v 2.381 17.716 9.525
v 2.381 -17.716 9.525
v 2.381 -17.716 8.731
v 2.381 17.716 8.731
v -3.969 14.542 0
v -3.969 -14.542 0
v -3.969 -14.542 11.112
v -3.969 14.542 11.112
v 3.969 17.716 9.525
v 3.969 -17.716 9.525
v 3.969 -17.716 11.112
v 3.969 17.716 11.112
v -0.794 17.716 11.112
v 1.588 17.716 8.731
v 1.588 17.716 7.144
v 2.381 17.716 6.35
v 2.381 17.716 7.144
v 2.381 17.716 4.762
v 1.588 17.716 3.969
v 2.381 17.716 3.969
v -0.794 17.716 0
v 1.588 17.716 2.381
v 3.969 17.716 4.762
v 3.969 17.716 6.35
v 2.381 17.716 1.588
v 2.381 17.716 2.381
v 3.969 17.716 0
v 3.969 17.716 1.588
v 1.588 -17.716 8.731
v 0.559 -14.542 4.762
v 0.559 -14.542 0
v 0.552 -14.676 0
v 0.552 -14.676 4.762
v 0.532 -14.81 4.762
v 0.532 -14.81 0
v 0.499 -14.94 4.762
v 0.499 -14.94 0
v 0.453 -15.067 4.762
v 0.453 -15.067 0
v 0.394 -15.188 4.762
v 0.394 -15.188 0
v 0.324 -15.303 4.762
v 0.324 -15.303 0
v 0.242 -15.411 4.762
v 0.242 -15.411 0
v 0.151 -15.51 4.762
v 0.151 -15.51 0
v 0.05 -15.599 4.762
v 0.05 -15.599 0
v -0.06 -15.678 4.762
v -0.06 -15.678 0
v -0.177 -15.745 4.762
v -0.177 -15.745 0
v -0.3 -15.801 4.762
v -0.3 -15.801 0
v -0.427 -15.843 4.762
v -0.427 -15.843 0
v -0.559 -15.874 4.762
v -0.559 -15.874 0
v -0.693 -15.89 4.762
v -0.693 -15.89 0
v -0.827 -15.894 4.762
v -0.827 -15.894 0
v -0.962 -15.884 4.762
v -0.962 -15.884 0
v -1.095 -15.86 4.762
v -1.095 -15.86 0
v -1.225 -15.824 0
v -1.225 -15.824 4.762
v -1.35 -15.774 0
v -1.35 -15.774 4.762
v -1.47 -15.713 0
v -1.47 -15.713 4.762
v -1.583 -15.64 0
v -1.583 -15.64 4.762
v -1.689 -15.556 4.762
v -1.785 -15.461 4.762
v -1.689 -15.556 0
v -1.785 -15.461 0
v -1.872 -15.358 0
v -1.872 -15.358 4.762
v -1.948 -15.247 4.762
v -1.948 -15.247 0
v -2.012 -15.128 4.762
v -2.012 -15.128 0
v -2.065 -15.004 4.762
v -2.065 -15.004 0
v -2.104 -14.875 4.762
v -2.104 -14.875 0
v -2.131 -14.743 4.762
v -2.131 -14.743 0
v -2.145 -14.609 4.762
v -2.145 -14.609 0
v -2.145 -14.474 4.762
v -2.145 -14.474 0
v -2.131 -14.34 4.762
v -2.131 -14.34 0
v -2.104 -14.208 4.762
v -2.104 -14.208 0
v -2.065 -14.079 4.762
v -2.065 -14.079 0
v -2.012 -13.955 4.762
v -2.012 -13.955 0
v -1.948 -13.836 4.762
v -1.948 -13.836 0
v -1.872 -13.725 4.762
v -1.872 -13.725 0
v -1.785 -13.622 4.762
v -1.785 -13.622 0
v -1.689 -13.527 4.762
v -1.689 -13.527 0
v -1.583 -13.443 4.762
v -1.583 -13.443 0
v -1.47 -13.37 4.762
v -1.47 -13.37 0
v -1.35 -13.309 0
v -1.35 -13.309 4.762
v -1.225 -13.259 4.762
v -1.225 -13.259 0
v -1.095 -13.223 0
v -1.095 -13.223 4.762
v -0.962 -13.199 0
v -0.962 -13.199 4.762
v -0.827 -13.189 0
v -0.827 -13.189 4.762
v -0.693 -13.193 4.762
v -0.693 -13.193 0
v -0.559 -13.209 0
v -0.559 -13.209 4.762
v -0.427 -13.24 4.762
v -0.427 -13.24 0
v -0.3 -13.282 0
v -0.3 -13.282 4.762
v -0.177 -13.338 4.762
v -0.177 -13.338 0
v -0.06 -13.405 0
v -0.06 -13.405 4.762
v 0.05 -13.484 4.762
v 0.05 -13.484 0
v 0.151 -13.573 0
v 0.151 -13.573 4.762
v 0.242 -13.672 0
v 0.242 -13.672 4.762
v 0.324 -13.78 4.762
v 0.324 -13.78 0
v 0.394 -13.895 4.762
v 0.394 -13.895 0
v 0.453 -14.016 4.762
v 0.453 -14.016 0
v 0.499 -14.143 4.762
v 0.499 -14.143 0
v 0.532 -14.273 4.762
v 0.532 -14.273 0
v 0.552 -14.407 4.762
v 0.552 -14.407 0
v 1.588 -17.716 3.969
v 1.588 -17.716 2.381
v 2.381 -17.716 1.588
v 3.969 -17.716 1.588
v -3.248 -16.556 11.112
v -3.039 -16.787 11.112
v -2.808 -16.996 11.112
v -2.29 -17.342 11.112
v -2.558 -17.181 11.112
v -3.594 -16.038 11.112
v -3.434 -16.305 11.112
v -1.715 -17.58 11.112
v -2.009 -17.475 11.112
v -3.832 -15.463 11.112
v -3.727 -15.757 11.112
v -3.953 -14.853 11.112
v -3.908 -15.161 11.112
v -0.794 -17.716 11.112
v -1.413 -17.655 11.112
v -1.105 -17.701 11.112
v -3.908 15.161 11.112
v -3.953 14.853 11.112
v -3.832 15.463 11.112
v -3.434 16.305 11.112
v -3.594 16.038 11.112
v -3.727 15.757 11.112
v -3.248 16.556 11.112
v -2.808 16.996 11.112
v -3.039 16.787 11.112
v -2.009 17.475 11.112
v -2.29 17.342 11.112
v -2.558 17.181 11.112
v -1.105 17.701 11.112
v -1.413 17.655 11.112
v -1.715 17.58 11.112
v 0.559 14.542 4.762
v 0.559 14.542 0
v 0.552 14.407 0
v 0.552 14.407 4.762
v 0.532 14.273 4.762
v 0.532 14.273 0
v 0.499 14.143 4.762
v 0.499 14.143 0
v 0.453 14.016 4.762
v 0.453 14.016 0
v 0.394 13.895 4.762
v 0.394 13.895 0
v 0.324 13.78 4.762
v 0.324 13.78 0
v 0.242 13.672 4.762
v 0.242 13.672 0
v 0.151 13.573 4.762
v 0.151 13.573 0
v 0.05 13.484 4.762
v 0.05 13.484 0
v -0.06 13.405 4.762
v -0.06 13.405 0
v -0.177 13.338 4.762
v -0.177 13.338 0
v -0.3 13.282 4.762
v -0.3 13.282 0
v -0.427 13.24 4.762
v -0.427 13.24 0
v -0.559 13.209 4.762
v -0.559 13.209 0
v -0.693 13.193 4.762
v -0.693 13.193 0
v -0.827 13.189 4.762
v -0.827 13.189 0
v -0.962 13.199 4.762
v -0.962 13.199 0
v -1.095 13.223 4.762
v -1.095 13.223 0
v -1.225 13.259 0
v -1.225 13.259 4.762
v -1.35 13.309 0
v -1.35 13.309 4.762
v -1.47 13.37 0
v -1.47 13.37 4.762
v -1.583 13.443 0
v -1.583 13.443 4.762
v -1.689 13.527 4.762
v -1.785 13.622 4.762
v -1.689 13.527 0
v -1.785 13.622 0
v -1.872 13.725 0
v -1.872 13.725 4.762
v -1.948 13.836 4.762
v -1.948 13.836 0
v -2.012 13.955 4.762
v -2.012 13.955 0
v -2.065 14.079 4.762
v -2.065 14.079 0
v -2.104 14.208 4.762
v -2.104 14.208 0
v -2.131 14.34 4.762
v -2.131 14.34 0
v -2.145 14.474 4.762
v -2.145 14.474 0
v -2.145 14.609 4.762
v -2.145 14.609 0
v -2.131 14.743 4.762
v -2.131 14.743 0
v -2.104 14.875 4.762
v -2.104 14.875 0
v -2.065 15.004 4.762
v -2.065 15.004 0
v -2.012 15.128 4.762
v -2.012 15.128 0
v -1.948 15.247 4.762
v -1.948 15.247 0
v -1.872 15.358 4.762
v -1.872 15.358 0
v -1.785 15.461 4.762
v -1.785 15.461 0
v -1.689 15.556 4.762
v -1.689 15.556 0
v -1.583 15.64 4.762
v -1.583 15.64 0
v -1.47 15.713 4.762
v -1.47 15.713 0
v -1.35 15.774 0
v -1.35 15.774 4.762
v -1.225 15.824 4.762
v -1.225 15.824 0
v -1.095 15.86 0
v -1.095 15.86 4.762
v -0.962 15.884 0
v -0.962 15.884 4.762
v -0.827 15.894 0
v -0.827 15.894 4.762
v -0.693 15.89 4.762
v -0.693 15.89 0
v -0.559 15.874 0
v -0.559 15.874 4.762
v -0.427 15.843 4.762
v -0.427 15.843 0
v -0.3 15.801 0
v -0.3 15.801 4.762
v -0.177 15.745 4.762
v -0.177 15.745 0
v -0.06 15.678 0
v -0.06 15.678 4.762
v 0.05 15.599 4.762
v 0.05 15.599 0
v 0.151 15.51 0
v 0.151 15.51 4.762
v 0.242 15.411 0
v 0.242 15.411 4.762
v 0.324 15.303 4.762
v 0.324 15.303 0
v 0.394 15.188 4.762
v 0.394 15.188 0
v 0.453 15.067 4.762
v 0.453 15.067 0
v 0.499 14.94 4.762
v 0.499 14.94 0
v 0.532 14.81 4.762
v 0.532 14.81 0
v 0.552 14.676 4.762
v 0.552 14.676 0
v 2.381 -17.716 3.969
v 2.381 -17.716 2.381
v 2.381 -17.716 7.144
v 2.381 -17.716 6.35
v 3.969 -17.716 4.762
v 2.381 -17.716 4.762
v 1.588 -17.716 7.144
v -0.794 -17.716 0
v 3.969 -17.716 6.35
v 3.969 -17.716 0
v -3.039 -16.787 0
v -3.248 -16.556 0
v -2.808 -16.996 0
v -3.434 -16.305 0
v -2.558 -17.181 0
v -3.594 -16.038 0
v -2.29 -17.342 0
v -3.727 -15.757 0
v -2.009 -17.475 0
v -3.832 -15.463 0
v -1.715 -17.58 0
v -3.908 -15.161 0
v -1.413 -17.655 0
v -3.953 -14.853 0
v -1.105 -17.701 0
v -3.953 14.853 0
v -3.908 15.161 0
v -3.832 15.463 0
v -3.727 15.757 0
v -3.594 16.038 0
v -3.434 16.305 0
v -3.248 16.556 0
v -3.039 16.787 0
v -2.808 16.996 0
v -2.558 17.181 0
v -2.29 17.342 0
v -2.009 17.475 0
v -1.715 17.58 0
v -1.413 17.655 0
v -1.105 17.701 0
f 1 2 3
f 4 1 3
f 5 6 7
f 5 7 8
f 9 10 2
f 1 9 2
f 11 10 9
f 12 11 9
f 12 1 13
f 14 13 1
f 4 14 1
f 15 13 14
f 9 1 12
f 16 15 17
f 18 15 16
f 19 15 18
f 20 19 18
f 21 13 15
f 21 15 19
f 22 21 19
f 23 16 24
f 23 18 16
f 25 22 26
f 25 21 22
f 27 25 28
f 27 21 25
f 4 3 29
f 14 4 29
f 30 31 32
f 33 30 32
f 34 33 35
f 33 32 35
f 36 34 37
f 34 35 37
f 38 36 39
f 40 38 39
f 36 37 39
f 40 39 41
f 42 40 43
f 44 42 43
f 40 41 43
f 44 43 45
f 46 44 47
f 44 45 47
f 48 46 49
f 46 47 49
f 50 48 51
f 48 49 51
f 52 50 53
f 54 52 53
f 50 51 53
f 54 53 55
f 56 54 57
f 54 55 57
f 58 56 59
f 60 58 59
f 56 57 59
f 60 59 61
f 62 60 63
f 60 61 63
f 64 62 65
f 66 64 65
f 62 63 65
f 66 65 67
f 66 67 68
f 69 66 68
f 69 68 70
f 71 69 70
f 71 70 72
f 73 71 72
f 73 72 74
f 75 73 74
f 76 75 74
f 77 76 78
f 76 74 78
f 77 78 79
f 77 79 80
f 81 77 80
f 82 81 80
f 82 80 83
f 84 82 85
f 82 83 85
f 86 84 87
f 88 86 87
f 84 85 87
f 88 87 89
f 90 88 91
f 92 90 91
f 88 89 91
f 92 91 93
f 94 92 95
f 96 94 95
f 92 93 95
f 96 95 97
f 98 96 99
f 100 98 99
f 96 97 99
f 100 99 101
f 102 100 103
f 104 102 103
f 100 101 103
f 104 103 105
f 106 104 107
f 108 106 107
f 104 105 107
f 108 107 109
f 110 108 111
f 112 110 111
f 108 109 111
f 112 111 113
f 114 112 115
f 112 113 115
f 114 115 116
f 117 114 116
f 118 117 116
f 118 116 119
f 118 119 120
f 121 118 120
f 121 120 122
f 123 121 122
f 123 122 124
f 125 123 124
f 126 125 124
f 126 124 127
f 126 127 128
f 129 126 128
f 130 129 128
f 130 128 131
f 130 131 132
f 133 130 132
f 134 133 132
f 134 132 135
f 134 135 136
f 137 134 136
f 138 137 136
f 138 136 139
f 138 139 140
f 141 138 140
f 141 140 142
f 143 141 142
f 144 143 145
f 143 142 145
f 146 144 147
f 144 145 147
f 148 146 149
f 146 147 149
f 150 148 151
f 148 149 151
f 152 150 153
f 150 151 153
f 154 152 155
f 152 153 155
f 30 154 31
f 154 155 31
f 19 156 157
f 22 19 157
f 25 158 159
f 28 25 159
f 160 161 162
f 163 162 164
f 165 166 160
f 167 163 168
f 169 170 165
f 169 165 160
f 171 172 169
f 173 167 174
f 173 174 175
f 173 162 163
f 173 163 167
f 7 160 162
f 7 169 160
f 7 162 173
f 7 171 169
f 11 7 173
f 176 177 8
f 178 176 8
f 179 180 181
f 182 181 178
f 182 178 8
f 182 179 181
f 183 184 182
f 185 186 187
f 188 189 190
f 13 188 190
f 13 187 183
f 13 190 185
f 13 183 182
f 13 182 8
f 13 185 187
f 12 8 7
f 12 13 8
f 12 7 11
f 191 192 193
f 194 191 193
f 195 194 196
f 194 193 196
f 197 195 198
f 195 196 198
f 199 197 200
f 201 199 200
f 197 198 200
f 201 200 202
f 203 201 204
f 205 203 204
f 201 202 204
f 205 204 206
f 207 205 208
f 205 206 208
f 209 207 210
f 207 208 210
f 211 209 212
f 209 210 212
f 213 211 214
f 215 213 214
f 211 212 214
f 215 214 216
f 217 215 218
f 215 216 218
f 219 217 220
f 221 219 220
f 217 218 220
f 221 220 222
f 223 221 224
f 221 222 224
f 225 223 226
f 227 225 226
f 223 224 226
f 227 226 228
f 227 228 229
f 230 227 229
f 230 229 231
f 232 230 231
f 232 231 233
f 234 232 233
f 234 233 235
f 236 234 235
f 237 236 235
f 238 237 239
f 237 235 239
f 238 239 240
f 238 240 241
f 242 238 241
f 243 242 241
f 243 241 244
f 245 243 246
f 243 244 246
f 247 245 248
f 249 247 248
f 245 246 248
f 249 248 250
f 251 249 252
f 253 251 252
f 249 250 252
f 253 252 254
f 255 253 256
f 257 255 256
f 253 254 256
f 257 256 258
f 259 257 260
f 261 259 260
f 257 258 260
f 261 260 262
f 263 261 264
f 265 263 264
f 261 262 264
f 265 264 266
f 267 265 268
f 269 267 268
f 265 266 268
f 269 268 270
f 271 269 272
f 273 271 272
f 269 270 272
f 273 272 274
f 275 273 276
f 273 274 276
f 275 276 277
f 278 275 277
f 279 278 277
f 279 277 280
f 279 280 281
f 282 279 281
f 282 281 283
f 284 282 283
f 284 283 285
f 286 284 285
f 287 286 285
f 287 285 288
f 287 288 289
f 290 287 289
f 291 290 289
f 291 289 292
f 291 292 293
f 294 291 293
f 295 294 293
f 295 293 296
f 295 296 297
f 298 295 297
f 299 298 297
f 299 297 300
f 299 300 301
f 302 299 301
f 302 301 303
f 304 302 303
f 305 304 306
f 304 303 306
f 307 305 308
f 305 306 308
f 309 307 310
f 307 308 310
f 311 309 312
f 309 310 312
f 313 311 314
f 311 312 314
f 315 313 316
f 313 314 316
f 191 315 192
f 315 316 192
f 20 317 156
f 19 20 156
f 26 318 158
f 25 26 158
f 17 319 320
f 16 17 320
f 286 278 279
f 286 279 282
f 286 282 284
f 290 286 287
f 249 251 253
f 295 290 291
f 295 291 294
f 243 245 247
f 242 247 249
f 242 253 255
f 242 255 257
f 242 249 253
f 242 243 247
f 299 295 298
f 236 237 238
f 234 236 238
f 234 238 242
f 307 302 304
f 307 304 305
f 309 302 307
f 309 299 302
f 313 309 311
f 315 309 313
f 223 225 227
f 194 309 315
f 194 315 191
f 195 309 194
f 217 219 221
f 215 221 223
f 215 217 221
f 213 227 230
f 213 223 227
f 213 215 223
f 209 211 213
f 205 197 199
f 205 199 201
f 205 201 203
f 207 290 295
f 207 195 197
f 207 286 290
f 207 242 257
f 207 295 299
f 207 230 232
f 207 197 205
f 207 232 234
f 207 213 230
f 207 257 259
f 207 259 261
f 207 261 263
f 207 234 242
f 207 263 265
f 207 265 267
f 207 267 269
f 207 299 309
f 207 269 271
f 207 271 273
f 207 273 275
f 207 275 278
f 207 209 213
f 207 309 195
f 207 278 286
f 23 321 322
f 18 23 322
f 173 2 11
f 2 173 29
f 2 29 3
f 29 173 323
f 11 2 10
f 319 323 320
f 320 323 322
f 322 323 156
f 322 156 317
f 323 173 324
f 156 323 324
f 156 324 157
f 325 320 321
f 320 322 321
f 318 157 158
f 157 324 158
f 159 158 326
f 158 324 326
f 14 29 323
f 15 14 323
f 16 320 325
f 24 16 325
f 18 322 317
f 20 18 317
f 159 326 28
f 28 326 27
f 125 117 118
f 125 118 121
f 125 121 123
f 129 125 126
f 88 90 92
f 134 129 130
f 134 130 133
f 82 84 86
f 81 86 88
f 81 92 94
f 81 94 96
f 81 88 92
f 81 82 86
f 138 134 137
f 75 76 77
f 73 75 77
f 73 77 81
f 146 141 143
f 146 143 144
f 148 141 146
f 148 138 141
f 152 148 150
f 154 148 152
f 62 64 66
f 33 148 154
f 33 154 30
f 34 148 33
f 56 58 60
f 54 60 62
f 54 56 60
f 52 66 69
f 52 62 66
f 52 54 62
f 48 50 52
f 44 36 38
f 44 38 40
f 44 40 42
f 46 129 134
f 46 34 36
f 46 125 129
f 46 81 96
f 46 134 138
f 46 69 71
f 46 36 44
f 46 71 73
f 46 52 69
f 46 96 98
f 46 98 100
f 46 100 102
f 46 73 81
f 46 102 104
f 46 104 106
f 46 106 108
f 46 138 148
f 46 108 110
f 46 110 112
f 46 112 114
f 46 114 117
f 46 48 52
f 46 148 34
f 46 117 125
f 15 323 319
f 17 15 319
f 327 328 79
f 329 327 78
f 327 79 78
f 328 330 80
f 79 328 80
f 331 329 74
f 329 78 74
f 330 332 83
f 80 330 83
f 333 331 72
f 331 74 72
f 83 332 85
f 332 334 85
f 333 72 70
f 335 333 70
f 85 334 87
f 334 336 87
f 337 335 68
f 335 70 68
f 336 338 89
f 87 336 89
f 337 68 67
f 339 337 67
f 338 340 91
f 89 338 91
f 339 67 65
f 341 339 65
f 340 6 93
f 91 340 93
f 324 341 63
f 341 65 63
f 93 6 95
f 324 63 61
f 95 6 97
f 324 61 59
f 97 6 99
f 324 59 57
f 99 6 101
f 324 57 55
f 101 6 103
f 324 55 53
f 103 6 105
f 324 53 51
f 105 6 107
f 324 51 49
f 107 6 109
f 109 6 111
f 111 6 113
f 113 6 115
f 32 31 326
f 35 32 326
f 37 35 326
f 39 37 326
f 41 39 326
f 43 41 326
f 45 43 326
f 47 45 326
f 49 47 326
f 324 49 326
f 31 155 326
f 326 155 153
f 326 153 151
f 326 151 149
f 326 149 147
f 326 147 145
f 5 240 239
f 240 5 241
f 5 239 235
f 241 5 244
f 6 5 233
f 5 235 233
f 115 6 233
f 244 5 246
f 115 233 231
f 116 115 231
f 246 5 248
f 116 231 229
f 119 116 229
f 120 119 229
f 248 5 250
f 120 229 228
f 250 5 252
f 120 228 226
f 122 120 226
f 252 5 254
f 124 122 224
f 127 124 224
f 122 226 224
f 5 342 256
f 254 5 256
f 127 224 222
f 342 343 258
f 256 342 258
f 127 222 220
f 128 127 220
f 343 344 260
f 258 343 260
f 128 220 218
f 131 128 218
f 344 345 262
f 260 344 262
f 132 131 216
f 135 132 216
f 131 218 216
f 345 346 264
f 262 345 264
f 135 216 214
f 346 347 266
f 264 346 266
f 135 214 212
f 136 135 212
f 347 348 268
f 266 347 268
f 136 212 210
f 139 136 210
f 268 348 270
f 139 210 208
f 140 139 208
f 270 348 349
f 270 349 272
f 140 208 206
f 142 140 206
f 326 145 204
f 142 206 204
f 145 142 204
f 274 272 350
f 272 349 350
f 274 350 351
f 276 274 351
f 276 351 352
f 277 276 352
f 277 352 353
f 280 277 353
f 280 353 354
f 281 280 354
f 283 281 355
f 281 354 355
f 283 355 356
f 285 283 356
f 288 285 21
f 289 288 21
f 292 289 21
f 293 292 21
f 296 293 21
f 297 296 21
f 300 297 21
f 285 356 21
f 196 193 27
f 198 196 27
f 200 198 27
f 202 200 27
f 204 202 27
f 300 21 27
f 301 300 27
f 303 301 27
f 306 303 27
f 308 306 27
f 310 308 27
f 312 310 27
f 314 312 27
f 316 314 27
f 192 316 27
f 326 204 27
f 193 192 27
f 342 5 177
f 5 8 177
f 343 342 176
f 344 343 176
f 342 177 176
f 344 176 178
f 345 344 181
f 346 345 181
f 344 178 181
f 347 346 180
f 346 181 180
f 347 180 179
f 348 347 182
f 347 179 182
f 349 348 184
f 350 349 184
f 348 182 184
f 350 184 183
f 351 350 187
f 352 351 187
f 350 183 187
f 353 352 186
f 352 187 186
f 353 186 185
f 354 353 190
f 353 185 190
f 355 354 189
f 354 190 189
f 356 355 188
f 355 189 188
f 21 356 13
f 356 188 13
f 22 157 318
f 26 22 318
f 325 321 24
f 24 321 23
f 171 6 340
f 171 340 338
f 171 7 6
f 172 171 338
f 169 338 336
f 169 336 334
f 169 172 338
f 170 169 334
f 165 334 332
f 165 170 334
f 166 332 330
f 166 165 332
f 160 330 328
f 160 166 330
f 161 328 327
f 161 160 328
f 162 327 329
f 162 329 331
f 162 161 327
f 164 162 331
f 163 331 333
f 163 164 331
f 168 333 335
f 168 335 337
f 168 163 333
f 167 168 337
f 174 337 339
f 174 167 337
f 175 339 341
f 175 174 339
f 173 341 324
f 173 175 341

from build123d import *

# Parameters (mm, degrees)
F0_W     = 7.9375
F0_H     = 35.433
F1_DEPTH = 11.1125
F3_DEPTH = 35.433
F4_R     = 1.35255
F5_DEPTH = 4.7625
F6_R     = 3.175


with BuildPart() as f1:
    # F0 (on Top) → F1 (new body)
    with BuildSketch(Plane.XY):
        Rectangle(F0_W, F0_H)
    extrude(amount=F1_DEPTH)

    # F2 (on face) → F3 (cut, through all)
    with BuildSketch(Plane.XZ.offset(17.7165)):
        Polygon((3.96875, 9.525), (2.38125, 9.525), (2.38125, 8.73125), (1.5875, 8.73125), (1.5875, 7.14375), (2.38125, 7.14375), (2.38125, 6.35), (3.96875, 6.35), align=None)
        Polygon((3.96875, 4.7625), (2.38125, 4.7625), (2.38125, 3.96875), (1.5875, 3.96875), (1.5875, 2.38125), (2.38125, 2.38125), (2.38125, 1.5875), (3.96875, 1.5875), align=None)
    extrude(amount=-F3_DEPTH, mode=Mode.SUBTRACT)

    # F4 (on face) → F5 (cut)
    with BuildSketch(Plane(origin=(0, 0, 0), x_dir=(1, 0, 0), z_dir=(0, 0, -1))):
        with Locations((-0.79375, 14.5415)):
            Circle(F4_R)
        with Locations((-0.79375, -14.5415)):
            Circle(F4_R)
    extrude(amount=-F5_DEPTH, mode=Mode.SUBTRACT)

    # F6
    f6_edges = [f1.edges().sort_by_distance(p)[0] for p in [
        (-3.96875, 17.7165, 5.55625),
        (-3.96875, -17.7165, 5.55625),
    ]]
    fillet(f6_edges, radius=F6_R)


solid = f1.part
